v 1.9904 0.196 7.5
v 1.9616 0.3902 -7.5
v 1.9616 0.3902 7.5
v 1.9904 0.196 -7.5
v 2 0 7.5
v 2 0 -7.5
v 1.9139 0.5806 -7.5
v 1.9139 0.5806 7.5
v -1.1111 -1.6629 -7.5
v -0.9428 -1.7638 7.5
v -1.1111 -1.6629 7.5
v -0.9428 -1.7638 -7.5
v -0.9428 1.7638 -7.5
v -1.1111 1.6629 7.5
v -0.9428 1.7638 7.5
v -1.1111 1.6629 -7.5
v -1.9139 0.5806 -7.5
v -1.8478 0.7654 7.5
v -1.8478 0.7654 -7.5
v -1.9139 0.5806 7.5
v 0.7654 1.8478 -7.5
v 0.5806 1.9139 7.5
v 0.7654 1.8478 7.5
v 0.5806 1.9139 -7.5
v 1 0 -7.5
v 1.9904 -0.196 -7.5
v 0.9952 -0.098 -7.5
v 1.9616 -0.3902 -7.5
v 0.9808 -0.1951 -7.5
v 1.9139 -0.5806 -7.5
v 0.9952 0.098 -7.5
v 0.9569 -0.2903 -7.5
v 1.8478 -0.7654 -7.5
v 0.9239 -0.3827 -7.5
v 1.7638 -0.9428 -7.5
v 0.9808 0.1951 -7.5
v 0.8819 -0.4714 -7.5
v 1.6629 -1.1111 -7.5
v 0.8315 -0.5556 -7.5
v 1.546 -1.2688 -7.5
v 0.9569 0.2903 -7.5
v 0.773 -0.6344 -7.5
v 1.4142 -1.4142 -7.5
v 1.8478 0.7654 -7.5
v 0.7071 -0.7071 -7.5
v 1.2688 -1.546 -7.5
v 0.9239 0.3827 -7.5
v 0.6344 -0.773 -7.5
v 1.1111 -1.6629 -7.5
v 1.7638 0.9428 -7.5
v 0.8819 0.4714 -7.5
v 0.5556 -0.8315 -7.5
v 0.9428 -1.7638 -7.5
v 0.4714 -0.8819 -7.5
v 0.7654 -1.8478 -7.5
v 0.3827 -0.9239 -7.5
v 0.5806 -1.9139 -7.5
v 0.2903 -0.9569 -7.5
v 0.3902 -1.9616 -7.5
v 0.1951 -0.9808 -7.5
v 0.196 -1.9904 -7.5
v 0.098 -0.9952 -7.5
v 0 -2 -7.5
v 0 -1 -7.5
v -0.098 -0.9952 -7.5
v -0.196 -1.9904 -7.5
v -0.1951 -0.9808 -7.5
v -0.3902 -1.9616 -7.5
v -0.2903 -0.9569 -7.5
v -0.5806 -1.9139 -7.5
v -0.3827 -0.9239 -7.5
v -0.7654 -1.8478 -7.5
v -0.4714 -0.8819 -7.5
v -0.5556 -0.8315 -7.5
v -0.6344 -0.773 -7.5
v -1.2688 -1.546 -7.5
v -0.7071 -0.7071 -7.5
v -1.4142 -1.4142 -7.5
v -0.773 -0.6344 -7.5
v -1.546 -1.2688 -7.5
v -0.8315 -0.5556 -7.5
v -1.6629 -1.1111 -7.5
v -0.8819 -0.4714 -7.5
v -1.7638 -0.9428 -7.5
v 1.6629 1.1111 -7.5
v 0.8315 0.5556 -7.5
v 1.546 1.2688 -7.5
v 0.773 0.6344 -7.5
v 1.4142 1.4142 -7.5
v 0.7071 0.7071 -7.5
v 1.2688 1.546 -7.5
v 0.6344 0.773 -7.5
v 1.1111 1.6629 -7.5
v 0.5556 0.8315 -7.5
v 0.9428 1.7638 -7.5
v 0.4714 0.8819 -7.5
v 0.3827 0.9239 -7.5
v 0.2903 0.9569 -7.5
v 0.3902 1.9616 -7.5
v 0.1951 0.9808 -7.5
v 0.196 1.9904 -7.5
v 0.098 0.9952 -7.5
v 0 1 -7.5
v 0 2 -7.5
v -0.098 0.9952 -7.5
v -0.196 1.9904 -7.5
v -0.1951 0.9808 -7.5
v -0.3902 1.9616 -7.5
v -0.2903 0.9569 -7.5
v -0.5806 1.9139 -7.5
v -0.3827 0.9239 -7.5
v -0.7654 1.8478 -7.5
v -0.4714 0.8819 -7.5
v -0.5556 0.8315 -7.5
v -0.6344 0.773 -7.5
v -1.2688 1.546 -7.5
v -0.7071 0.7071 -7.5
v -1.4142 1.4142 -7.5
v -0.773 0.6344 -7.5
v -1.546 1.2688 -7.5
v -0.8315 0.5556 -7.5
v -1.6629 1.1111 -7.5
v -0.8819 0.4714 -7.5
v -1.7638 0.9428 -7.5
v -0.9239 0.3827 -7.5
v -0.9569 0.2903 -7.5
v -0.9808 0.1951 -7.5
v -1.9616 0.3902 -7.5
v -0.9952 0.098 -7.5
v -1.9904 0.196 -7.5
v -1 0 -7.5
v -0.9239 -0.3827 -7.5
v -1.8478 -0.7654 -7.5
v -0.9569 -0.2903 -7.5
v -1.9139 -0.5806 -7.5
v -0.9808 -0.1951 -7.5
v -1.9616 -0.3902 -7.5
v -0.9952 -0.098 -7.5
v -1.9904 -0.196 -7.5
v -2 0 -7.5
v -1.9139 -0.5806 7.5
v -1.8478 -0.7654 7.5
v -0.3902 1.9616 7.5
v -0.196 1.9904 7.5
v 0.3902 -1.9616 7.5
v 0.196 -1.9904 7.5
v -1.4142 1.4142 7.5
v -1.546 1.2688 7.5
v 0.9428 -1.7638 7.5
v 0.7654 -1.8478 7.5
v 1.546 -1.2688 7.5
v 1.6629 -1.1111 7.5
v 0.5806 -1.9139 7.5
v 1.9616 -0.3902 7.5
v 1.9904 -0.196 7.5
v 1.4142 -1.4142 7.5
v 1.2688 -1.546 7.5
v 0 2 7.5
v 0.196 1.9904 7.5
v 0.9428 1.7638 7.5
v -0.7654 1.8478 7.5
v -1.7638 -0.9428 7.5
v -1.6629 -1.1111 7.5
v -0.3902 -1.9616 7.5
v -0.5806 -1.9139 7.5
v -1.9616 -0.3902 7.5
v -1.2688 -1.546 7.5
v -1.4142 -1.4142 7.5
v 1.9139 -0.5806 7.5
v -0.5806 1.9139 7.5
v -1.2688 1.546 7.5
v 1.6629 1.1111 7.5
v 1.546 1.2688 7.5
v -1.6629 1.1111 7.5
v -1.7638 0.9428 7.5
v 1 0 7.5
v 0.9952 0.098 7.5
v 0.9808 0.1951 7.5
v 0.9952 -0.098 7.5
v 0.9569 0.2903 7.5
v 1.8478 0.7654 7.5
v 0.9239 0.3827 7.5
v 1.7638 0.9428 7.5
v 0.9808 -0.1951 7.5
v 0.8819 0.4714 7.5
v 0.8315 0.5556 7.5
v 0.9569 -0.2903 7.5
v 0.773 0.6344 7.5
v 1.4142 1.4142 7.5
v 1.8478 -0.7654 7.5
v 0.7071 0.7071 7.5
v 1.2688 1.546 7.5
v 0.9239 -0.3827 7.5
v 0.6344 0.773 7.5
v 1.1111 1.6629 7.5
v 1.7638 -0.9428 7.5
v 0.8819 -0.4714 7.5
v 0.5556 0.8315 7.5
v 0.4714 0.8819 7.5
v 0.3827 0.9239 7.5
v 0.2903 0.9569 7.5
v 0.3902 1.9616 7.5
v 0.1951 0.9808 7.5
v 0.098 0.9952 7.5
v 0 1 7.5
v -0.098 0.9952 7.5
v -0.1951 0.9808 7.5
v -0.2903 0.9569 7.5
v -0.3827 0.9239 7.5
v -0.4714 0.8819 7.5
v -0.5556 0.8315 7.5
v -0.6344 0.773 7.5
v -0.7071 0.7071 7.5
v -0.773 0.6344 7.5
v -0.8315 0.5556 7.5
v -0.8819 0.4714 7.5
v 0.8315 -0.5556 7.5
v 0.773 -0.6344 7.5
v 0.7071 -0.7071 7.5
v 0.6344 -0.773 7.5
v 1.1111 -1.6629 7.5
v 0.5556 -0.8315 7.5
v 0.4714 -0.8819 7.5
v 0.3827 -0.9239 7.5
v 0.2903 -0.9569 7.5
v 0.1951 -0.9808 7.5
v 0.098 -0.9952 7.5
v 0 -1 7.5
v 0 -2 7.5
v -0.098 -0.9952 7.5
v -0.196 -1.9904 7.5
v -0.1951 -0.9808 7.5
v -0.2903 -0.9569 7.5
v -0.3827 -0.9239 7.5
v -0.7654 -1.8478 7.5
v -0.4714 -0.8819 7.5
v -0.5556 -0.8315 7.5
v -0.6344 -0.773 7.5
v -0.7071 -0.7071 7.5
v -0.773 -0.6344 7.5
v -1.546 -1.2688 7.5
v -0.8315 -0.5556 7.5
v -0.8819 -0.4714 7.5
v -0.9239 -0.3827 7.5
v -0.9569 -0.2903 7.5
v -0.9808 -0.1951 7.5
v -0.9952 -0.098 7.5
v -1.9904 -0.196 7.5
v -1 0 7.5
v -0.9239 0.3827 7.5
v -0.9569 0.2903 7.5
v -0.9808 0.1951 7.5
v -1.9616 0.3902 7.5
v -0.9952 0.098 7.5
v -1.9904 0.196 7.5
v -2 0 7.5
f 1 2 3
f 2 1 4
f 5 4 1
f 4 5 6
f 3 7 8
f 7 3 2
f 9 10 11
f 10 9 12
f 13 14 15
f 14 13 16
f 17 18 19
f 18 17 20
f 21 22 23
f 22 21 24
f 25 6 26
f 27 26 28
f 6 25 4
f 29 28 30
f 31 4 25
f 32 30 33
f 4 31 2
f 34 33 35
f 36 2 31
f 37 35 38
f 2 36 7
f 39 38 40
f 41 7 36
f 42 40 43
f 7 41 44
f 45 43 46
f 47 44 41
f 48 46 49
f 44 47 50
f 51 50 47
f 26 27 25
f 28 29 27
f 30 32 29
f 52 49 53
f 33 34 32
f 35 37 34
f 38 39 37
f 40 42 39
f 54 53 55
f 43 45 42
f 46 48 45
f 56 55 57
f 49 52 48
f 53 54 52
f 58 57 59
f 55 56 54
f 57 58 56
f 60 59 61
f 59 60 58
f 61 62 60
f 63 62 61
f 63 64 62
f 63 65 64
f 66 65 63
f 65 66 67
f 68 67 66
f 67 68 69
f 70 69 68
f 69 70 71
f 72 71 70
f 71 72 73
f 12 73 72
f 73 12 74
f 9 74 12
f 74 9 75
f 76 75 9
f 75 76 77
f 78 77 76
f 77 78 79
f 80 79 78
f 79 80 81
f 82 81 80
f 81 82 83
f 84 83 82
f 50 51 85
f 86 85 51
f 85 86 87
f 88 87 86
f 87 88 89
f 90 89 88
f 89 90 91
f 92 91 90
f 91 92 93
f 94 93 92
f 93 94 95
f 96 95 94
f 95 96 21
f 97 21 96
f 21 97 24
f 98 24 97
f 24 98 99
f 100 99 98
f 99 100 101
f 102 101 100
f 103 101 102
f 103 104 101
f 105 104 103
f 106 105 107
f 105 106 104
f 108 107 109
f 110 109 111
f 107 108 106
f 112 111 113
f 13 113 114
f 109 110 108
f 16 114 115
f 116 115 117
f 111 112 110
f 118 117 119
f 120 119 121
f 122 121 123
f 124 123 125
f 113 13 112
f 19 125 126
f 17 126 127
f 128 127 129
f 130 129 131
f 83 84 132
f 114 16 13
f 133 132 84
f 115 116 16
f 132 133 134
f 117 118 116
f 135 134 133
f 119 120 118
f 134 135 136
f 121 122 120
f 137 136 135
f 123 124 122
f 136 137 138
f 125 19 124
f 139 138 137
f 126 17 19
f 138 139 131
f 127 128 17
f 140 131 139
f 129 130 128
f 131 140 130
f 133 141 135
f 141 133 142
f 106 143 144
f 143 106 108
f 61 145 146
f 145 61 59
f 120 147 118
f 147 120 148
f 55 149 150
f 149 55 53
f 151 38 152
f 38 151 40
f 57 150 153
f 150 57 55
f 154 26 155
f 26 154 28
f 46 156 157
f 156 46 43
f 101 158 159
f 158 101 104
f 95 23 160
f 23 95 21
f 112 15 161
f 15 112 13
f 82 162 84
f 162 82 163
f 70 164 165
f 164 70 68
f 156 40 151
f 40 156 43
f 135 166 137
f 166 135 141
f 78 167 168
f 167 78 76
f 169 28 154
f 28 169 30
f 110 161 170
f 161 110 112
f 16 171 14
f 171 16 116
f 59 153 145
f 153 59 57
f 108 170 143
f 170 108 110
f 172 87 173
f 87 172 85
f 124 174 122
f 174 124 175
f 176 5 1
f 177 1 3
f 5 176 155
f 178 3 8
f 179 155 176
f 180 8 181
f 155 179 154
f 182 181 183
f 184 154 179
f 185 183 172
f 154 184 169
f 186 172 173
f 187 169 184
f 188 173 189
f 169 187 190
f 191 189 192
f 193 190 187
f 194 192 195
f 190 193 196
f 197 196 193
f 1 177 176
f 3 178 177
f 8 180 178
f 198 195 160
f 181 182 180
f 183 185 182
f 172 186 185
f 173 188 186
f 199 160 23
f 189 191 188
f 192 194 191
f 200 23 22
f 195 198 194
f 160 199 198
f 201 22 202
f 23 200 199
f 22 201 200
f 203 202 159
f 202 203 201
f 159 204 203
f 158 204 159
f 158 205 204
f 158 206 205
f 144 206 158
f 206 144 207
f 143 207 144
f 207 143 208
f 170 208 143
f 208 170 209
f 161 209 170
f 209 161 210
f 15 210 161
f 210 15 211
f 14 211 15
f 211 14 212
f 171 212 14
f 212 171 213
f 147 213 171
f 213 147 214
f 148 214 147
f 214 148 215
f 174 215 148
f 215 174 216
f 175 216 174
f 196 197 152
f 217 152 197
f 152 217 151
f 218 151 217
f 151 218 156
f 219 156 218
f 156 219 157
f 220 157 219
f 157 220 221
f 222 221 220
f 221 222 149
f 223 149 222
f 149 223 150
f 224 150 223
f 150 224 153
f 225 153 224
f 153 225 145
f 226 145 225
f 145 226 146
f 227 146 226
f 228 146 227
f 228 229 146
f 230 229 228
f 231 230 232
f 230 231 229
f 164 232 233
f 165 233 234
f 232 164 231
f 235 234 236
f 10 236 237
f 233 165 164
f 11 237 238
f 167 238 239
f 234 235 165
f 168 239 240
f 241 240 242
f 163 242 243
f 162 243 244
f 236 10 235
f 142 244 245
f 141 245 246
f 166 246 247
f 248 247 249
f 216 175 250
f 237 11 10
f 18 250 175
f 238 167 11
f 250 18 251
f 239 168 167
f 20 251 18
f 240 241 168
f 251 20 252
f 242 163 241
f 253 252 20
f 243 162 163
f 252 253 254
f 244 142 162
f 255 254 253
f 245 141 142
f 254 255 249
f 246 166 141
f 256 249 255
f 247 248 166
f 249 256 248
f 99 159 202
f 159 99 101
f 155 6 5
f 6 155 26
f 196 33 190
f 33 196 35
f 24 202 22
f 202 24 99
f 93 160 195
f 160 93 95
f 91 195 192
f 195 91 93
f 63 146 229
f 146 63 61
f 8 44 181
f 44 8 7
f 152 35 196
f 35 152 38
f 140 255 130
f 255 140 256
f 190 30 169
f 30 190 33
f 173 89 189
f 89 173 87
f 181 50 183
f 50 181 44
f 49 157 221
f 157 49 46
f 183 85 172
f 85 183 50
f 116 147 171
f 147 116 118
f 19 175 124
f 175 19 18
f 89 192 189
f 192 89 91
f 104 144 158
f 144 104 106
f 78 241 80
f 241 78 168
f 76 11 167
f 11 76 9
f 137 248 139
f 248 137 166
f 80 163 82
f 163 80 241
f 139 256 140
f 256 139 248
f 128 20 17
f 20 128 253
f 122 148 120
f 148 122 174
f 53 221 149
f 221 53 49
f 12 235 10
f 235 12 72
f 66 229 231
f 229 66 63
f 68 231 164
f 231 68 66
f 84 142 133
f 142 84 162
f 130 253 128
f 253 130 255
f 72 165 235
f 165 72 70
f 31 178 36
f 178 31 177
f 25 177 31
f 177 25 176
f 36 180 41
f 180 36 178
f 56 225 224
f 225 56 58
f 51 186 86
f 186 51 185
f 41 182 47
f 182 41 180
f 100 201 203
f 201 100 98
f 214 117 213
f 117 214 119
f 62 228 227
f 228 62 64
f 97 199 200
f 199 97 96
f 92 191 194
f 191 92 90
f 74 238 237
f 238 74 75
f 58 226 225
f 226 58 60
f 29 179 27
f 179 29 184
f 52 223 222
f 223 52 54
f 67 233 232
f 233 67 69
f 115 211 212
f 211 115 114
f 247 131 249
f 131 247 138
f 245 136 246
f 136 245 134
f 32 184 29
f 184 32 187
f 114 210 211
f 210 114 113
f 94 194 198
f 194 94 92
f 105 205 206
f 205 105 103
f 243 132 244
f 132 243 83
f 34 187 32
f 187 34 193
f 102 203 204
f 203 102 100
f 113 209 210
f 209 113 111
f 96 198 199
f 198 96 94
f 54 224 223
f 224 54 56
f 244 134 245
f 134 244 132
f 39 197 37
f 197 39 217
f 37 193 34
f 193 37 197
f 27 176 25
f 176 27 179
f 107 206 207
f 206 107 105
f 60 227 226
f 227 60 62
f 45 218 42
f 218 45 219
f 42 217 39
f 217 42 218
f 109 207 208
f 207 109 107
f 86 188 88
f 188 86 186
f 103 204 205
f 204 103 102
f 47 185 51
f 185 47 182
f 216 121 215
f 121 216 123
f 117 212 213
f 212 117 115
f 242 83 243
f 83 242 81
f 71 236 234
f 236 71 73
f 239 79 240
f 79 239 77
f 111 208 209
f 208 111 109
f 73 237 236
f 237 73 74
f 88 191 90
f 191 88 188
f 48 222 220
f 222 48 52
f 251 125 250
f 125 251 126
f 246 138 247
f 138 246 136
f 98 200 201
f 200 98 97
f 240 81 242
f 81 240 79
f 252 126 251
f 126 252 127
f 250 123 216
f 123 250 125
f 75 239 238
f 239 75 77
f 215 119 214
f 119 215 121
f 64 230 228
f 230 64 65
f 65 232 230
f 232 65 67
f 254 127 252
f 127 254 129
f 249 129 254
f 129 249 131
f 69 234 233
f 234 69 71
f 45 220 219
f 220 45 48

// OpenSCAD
// Parameters
length = 15; //[8:30:1]
outer_diameter = 4; //[2:8:0.1]
inner_diameter = 2; //[1:6:0.1]
center = 1; //[0:1:1]
forced_id = 0; //[0:6:0.1]
overlap = 1; //[0.5:2:0.1]

// Tubing - complete geometry
module tubing() {
  color([0.85, 0.85, 0.8]) { // Off-white for PTFE
    difference() {
      // Outer tube
      translate([0, 0, center == 1 ? 0 : length / 2])
        cylinder(r=outer_diameter / 2, h=length, center=true, $fn=64);
      
      // Inner bore
      translate([0, 0, center == 1 ? 0 : length / 2])
        cylinder(r=((forced_id > 0) ? forced_id : inner_diameter) / 2, h=length + overlap, center=true, $fn=64);
    }
  }
}

// Assembly
module assembly() {
  tubing();
}

assembly();
